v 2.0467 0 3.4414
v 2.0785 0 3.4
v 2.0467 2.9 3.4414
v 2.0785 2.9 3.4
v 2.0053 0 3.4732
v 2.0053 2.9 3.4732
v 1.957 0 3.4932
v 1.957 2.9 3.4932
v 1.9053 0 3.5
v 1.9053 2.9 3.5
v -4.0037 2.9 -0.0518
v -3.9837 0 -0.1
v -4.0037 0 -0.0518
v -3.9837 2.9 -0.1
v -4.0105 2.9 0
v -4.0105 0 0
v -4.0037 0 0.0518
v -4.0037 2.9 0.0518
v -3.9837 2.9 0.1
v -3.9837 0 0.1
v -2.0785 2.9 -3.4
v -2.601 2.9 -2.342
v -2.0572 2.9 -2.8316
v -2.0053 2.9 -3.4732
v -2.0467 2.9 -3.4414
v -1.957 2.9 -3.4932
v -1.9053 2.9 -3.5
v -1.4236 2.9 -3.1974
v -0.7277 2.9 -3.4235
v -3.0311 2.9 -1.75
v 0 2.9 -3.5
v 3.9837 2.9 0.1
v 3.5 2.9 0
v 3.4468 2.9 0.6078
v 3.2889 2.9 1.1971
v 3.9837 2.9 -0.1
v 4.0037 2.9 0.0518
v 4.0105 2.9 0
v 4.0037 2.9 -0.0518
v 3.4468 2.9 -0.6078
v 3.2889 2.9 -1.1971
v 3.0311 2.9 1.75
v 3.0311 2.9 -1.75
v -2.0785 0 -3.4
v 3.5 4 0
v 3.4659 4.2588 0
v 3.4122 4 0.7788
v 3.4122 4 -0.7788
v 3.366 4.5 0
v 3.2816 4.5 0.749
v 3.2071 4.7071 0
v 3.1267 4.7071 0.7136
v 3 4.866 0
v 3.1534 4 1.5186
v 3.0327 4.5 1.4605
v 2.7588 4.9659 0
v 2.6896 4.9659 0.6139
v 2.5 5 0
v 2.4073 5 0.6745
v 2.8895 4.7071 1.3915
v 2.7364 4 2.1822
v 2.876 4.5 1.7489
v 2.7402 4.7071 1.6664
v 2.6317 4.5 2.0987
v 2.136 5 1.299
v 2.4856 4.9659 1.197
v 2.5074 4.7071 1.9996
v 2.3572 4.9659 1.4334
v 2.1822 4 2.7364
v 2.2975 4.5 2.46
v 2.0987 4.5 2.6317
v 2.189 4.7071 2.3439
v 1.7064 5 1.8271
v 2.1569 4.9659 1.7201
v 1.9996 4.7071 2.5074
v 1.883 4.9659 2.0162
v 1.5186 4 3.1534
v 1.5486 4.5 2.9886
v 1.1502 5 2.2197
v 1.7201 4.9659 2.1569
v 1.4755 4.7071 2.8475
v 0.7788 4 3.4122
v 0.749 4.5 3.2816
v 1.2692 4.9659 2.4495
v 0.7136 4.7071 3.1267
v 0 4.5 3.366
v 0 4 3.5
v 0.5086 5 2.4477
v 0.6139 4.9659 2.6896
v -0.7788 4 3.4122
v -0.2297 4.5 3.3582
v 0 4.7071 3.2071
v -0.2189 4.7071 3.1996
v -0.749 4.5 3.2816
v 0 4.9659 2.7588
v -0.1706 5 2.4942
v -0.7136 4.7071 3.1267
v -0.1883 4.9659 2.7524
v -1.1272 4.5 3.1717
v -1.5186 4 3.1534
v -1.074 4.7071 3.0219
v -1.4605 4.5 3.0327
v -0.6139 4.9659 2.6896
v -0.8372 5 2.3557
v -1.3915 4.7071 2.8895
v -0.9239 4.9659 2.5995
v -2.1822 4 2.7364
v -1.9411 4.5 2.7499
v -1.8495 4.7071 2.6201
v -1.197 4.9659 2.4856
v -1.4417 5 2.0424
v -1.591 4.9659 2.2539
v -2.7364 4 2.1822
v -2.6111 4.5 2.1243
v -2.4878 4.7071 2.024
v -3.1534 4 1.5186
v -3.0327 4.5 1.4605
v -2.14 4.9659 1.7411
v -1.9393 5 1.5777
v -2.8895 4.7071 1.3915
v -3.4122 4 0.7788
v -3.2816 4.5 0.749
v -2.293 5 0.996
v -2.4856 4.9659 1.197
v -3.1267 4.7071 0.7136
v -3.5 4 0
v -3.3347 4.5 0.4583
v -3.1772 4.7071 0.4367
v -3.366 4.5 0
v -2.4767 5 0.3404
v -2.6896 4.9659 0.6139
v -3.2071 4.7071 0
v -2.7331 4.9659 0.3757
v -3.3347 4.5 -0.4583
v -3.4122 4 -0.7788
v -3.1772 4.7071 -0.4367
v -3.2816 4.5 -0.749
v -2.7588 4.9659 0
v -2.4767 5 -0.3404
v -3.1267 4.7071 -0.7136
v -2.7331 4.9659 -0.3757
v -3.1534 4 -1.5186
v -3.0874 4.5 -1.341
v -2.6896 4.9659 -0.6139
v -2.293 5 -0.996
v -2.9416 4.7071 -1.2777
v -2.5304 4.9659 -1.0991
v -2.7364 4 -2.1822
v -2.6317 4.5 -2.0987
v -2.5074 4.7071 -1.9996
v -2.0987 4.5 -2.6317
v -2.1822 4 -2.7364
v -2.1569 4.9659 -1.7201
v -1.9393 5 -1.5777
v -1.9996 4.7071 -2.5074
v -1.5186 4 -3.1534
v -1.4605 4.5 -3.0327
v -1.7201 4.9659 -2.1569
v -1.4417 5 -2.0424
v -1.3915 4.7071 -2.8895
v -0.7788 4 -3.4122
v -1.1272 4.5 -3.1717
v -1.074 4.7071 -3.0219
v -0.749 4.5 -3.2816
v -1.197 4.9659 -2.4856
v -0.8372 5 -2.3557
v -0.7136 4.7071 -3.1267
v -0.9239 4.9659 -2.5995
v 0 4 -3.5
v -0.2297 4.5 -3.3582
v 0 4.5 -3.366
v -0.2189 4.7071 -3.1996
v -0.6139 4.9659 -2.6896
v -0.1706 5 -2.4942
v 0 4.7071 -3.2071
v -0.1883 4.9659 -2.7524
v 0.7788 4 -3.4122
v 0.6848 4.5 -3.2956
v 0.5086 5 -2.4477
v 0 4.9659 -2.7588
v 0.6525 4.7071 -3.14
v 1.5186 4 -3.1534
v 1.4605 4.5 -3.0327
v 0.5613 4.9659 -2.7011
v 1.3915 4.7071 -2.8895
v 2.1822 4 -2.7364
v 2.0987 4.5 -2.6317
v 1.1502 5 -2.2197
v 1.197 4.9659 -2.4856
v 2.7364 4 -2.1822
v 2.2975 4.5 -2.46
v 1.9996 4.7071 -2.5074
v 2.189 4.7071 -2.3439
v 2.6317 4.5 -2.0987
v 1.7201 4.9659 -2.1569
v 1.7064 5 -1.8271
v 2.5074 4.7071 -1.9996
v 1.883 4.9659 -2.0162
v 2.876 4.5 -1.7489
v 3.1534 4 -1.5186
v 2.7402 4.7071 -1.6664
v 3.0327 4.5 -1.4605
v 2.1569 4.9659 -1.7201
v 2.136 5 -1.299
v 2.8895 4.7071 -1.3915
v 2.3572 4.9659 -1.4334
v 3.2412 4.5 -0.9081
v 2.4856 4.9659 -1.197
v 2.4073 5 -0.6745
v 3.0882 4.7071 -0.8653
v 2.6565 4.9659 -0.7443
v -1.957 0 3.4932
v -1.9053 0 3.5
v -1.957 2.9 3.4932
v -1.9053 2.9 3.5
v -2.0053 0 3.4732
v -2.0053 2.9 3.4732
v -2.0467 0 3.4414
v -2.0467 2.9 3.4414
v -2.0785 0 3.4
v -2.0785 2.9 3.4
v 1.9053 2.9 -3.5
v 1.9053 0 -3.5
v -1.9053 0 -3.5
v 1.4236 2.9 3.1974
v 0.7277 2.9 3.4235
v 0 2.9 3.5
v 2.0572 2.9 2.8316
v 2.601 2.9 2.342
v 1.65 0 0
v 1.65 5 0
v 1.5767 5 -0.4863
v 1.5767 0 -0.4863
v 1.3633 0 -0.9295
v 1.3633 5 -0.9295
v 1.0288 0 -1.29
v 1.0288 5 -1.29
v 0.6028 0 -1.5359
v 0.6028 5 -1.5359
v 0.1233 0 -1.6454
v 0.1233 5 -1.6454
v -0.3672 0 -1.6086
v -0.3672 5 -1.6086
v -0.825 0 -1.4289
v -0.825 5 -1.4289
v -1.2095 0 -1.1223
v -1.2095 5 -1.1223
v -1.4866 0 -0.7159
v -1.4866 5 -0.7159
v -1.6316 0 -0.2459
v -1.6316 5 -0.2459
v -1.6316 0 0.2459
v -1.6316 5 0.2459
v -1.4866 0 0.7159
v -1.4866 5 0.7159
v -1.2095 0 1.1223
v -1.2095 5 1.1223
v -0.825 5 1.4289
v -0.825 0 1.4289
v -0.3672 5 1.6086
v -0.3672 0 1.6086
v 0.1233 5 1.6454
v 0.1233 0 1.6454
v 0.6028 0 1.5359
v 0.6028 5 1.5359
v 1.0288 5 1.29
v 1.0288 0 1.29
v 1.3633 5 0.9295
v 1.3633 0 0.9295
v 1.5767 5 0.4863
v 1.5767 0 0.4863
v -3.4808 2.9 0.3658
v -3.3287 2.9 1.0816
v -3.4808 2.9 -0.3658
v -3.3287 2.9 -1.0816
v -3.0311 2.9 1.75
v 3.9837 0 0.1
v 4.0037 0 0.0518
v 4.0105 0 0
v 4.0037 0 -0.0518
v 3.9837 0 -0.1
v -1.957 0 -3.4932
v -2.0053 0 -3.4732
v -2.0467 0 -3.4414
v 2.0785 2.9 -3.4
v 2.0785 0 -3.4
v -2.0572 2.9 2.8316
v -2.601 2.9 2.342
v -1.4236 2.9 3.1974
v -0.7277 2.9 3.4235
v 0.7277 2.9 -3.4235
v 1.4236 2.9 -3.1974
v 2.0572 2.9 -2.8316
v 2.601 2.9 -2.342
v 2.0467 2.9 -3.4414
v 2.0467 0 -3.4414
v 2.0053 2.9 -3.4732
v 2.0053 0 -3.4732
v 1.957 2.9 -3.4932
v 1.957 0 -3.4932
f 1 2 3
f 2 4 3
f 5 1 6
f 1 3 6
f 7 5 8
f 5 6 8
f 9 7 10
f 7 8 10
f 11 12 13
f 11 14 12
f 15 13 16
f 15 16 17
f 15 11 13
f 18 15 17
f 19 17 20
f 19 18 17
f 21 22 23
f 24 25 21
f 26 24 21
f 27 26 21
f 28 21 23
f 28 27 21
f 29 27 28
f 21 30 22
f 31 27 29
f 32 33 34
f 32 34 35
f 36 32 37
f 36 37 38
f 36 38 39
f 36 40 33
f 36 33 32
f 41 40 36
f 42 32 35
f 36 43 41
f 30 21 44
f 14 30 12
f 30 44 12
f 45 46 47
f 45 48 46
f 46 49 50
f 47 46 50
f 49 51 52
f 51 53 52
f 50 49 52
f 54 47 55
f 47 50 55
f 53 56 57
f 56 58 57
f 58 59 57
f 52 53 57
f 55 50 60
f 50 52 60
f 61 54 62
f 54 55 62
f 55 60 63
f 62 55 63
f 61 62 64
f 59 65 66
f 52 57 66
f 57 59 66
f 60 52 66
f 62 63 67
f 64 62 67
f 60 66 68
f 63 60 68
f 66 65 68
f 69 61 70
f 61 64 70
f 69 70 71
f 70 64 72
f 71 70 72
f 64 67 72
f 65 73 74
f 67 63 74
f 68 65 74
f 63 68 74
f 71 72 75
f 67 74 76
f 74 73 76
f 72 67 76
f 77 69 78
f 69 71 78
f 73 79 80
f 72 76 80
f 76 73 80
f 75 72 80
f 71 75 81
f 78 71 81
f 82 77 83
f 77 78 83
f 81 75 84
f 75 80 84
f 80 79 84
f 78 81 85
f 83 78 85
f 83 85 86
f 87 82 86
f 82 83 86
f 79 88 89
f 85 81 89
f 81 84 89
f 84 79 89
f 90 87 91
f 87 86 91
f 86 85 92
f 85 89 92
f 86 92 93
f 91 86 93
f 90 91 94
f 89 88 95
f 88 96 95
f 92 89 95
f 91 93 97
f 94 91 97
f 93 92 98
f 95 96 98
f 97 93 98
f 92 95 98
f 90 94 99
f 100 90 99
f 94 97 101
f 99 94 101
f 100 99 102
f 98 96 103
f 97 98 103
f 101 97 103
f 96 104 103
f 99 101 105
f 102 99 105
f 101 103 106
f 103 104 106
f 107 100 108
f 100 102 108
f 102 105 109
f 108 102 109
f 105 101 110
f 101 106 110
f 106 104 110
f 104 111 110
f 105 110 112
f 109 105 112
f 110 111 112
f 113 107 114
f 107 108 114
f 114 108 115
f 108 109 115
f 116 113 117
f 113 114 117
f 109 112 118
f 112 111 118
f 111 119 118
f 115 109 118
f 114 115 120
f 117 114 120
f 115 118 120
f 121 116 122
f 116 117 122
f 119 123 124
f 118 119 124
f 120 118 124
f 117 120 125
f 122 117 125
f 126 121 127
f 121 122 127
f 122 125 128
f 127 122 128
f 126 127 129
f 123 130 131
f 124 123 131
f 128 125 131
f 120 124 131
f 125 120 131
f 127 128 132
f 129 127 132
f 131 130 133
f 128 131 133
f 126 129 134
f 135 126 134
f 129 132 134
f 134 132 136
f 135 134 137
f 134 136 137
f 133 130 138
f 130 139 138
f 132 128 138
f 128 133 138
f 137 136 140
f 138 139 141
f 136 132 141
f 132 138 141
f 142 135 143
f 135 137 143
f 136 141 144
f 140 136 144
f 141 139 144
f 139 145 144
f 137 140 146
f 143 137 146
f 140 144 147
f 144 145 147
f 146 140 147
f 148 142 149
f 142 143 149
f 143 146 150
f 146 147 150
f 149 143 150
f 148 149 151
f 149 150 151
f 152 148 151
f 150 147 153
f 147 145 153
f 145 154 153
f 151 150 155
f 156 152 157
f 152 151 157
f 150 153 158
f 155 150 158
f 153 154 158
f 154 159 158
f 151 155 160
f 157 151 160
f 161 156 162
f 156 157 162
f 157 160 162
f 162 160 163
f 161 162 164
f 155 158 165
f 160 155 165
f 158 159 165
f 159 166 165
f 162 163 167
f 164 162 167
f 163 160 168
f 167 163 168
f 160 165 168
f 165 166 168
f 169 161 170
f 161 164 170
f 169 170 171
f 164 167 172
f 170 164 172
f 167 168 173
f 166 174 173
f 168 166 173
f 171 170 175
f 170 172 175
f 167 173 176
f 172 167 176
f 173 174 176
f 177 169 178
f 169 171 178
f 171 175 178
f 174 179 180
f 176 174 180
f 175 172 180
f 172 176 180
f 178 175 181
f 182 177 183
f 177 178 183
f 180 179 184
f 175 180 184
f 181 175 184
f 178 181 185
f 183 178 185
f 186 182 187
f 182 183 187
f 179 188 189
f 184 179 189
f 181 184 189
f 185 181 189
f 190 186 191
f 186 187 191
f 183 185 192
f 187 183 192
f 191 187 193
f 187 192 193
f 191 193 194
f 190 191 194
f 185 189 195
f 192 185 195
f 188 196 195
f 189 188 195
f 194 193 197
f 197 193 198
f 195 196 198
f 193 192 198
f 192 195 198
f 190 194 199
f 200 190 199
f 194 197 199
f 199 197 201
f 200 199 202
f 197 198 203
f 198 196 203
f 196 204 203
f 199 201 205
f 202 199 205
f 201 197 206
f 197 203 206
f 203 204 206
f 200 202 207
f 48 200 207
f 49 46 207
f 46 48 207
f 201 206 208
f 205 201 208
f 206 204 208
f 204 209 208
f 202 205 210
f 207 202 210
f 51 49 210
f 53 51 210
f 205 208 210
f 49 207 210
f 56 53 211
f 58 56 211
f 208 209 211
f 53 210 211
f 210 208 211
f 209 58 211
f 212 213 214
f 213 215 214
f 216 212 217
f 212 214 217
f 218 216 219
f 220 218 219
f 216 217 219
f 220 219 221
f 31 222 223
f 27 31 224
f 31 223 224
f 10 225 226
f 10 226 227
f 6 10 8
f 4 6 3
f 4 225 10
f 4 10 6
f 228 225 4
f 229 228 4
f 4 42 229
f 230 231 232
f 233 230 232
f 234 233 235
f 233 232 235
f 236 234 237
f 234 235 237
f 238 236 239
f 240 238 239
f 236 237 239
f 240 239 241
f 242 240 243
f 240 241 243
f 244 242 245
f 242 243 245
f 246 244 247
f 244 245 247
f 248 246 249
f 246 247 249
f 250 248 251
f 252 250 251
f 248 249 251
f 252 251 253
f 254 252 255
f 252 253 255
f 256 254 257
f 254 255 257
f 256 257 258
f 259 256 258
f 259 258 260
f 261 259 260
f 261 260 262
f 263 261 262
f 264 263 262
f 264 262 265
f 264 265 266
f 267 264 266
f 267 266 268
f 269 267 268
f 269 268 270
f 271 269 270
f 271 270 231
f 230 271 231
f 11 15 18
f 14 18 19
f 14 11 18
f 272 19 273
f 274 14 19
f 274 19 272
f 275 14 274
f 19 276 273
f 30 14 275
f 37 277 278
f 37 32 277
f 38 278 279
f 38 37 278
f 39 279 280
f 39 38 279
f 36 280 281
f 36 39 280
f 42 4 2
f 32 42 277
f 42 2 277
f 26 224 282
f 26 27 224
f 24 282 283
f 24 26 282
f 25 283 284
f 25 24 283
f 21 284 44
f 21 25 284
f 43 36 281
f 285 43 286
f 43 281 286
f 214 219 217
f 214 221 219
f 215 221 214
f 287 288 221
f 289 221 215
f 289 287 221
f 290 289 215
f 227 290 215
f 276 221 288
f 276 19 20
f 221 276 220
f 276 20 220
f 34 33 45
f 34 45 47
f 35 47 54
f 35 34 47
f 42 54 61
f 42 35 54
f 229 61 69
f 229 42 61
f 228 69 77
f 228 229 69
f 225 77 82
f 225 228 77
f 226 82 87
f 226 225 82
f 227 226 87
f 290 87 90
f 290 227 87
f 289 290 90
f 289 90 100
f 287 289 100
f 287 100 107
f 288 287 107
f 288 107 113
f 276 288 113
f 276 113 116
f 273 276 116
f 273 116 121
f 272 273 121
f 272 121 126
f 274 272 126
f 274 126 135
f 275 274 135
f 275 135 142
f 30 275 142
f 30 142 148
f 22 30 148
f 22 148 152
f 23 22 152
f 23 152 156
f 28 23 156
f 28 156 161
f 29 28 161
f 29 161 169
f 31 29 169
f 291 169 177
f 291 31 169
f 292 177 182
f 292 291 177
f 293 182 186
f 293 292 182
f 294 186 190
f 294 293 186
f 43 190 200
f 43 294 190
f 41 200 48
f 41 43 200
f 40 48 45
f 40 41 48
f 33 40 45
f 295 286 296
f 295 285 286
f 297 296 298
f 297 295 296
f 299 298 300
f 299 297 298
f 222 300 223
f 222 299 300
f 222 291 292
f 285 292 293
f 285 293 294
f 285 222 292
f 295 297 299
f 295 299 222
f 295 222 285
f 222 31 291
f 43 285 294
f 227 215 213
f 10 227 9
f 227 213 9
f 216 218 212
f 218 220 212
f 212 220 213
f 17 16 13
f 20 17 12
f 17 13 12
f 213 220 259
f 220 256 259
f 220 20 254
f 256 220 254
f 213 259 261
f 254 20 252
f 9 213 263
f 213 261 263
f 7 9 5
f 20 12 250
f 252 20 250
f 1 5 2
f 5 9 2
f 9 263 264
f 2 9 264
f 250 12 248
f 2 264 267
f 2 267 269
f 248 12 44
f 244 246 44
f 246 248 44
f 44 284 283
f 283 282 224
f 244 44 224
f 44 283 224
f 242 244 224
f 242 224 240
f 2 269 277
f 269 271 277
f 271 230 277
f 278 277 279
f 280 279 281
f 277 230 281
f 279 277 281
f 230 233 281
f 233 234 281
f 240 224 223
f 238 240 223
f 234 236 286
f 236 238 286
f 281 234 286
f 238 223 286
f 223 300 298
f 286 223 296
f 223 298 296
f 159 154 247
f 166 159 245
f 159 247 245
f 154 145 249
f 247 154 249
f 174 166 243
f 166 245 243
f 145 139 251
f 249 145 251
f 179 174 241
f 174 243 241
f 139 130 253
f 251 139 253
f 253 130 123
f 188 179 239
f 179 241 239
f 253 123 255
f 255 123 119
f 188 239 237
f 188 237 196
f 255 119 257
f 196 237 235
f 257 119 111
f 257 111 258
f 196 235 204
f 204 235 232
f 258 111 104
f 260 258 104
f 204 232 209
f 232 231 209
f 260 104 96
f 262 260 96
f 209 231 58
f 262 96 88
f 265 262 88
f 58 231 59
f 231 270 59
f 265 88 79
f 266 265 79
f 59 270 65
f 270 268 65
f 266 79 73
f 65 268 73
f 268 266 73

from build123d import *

# Parameters (mm, degrees)
BOSS_EXTRUDE1_DEPTH = 2.9
SKETCH2_R           = 3.5
BOSS_EXTRUDE2_DEPTH = 5
FILLET1_R           = 1
FILLET2_R           = 0.2
M4_TAPPED_HOLE1_D   = 3.3


with BuildPart() as part:
    # Sketch1 → Boss-Extrude1 (new body)
    with BuildSketch(Plane(origin=(0, 0, 0), x_dir=(1, 0, 0), z_dir=(0, 1, 0))):
        Polygon((4.041451884, 0), (2.020725942, 3.5), (-2.020725942, 3.5), (-4.041451884, 0), (-2.020725942, -3.5), (2.020725942, -3.5), align=None)
    extrude(amount=BOSS_EXTRUDE1_DEPTH)

    # Sketch2 → Boss-Extrude2 (add)
    with BuildSketch(Plane.XZ):
        Circle(SKETCH2_R)
    extrude(amount=-BOSS_EXTRUDE2_DEPTH)

    # Fillet1
    fillet1_edges = [part.edges().sort_by_distance(p)[0] for p in [
        (-3.5, 5, 0),
    ]]
    fillet(fillet1_edges, radius=FILLET1_R)

    # Fillet2
    fillet2_edges = [part.edges().sort_by_distance(p)[0] for p in [
        (2.020725942, 1.45, 3.5),
        (-2.020725942, 1.45, 3.5),
        (-4.041451884, 1.45, 0),
        (-2.020725942, 1.45, -3.5),
        (2.020725942, 1.45, -3.5),
        (4.041451884, 1.45, 0),
    ]]
    fillet(fillet2_edges, radius=FILLET2_R)

    # M4 Tapped Hole1 (through all)
    with Locations(Plane(origin=(0, 0, 0), x_dir=(-1, 0, 0), z_dir=(0, -1, 0))):
        with Locations((0, 0)):
            Hole(M4_TAPPED_HOLE1_D / 2)


solid = part.part
